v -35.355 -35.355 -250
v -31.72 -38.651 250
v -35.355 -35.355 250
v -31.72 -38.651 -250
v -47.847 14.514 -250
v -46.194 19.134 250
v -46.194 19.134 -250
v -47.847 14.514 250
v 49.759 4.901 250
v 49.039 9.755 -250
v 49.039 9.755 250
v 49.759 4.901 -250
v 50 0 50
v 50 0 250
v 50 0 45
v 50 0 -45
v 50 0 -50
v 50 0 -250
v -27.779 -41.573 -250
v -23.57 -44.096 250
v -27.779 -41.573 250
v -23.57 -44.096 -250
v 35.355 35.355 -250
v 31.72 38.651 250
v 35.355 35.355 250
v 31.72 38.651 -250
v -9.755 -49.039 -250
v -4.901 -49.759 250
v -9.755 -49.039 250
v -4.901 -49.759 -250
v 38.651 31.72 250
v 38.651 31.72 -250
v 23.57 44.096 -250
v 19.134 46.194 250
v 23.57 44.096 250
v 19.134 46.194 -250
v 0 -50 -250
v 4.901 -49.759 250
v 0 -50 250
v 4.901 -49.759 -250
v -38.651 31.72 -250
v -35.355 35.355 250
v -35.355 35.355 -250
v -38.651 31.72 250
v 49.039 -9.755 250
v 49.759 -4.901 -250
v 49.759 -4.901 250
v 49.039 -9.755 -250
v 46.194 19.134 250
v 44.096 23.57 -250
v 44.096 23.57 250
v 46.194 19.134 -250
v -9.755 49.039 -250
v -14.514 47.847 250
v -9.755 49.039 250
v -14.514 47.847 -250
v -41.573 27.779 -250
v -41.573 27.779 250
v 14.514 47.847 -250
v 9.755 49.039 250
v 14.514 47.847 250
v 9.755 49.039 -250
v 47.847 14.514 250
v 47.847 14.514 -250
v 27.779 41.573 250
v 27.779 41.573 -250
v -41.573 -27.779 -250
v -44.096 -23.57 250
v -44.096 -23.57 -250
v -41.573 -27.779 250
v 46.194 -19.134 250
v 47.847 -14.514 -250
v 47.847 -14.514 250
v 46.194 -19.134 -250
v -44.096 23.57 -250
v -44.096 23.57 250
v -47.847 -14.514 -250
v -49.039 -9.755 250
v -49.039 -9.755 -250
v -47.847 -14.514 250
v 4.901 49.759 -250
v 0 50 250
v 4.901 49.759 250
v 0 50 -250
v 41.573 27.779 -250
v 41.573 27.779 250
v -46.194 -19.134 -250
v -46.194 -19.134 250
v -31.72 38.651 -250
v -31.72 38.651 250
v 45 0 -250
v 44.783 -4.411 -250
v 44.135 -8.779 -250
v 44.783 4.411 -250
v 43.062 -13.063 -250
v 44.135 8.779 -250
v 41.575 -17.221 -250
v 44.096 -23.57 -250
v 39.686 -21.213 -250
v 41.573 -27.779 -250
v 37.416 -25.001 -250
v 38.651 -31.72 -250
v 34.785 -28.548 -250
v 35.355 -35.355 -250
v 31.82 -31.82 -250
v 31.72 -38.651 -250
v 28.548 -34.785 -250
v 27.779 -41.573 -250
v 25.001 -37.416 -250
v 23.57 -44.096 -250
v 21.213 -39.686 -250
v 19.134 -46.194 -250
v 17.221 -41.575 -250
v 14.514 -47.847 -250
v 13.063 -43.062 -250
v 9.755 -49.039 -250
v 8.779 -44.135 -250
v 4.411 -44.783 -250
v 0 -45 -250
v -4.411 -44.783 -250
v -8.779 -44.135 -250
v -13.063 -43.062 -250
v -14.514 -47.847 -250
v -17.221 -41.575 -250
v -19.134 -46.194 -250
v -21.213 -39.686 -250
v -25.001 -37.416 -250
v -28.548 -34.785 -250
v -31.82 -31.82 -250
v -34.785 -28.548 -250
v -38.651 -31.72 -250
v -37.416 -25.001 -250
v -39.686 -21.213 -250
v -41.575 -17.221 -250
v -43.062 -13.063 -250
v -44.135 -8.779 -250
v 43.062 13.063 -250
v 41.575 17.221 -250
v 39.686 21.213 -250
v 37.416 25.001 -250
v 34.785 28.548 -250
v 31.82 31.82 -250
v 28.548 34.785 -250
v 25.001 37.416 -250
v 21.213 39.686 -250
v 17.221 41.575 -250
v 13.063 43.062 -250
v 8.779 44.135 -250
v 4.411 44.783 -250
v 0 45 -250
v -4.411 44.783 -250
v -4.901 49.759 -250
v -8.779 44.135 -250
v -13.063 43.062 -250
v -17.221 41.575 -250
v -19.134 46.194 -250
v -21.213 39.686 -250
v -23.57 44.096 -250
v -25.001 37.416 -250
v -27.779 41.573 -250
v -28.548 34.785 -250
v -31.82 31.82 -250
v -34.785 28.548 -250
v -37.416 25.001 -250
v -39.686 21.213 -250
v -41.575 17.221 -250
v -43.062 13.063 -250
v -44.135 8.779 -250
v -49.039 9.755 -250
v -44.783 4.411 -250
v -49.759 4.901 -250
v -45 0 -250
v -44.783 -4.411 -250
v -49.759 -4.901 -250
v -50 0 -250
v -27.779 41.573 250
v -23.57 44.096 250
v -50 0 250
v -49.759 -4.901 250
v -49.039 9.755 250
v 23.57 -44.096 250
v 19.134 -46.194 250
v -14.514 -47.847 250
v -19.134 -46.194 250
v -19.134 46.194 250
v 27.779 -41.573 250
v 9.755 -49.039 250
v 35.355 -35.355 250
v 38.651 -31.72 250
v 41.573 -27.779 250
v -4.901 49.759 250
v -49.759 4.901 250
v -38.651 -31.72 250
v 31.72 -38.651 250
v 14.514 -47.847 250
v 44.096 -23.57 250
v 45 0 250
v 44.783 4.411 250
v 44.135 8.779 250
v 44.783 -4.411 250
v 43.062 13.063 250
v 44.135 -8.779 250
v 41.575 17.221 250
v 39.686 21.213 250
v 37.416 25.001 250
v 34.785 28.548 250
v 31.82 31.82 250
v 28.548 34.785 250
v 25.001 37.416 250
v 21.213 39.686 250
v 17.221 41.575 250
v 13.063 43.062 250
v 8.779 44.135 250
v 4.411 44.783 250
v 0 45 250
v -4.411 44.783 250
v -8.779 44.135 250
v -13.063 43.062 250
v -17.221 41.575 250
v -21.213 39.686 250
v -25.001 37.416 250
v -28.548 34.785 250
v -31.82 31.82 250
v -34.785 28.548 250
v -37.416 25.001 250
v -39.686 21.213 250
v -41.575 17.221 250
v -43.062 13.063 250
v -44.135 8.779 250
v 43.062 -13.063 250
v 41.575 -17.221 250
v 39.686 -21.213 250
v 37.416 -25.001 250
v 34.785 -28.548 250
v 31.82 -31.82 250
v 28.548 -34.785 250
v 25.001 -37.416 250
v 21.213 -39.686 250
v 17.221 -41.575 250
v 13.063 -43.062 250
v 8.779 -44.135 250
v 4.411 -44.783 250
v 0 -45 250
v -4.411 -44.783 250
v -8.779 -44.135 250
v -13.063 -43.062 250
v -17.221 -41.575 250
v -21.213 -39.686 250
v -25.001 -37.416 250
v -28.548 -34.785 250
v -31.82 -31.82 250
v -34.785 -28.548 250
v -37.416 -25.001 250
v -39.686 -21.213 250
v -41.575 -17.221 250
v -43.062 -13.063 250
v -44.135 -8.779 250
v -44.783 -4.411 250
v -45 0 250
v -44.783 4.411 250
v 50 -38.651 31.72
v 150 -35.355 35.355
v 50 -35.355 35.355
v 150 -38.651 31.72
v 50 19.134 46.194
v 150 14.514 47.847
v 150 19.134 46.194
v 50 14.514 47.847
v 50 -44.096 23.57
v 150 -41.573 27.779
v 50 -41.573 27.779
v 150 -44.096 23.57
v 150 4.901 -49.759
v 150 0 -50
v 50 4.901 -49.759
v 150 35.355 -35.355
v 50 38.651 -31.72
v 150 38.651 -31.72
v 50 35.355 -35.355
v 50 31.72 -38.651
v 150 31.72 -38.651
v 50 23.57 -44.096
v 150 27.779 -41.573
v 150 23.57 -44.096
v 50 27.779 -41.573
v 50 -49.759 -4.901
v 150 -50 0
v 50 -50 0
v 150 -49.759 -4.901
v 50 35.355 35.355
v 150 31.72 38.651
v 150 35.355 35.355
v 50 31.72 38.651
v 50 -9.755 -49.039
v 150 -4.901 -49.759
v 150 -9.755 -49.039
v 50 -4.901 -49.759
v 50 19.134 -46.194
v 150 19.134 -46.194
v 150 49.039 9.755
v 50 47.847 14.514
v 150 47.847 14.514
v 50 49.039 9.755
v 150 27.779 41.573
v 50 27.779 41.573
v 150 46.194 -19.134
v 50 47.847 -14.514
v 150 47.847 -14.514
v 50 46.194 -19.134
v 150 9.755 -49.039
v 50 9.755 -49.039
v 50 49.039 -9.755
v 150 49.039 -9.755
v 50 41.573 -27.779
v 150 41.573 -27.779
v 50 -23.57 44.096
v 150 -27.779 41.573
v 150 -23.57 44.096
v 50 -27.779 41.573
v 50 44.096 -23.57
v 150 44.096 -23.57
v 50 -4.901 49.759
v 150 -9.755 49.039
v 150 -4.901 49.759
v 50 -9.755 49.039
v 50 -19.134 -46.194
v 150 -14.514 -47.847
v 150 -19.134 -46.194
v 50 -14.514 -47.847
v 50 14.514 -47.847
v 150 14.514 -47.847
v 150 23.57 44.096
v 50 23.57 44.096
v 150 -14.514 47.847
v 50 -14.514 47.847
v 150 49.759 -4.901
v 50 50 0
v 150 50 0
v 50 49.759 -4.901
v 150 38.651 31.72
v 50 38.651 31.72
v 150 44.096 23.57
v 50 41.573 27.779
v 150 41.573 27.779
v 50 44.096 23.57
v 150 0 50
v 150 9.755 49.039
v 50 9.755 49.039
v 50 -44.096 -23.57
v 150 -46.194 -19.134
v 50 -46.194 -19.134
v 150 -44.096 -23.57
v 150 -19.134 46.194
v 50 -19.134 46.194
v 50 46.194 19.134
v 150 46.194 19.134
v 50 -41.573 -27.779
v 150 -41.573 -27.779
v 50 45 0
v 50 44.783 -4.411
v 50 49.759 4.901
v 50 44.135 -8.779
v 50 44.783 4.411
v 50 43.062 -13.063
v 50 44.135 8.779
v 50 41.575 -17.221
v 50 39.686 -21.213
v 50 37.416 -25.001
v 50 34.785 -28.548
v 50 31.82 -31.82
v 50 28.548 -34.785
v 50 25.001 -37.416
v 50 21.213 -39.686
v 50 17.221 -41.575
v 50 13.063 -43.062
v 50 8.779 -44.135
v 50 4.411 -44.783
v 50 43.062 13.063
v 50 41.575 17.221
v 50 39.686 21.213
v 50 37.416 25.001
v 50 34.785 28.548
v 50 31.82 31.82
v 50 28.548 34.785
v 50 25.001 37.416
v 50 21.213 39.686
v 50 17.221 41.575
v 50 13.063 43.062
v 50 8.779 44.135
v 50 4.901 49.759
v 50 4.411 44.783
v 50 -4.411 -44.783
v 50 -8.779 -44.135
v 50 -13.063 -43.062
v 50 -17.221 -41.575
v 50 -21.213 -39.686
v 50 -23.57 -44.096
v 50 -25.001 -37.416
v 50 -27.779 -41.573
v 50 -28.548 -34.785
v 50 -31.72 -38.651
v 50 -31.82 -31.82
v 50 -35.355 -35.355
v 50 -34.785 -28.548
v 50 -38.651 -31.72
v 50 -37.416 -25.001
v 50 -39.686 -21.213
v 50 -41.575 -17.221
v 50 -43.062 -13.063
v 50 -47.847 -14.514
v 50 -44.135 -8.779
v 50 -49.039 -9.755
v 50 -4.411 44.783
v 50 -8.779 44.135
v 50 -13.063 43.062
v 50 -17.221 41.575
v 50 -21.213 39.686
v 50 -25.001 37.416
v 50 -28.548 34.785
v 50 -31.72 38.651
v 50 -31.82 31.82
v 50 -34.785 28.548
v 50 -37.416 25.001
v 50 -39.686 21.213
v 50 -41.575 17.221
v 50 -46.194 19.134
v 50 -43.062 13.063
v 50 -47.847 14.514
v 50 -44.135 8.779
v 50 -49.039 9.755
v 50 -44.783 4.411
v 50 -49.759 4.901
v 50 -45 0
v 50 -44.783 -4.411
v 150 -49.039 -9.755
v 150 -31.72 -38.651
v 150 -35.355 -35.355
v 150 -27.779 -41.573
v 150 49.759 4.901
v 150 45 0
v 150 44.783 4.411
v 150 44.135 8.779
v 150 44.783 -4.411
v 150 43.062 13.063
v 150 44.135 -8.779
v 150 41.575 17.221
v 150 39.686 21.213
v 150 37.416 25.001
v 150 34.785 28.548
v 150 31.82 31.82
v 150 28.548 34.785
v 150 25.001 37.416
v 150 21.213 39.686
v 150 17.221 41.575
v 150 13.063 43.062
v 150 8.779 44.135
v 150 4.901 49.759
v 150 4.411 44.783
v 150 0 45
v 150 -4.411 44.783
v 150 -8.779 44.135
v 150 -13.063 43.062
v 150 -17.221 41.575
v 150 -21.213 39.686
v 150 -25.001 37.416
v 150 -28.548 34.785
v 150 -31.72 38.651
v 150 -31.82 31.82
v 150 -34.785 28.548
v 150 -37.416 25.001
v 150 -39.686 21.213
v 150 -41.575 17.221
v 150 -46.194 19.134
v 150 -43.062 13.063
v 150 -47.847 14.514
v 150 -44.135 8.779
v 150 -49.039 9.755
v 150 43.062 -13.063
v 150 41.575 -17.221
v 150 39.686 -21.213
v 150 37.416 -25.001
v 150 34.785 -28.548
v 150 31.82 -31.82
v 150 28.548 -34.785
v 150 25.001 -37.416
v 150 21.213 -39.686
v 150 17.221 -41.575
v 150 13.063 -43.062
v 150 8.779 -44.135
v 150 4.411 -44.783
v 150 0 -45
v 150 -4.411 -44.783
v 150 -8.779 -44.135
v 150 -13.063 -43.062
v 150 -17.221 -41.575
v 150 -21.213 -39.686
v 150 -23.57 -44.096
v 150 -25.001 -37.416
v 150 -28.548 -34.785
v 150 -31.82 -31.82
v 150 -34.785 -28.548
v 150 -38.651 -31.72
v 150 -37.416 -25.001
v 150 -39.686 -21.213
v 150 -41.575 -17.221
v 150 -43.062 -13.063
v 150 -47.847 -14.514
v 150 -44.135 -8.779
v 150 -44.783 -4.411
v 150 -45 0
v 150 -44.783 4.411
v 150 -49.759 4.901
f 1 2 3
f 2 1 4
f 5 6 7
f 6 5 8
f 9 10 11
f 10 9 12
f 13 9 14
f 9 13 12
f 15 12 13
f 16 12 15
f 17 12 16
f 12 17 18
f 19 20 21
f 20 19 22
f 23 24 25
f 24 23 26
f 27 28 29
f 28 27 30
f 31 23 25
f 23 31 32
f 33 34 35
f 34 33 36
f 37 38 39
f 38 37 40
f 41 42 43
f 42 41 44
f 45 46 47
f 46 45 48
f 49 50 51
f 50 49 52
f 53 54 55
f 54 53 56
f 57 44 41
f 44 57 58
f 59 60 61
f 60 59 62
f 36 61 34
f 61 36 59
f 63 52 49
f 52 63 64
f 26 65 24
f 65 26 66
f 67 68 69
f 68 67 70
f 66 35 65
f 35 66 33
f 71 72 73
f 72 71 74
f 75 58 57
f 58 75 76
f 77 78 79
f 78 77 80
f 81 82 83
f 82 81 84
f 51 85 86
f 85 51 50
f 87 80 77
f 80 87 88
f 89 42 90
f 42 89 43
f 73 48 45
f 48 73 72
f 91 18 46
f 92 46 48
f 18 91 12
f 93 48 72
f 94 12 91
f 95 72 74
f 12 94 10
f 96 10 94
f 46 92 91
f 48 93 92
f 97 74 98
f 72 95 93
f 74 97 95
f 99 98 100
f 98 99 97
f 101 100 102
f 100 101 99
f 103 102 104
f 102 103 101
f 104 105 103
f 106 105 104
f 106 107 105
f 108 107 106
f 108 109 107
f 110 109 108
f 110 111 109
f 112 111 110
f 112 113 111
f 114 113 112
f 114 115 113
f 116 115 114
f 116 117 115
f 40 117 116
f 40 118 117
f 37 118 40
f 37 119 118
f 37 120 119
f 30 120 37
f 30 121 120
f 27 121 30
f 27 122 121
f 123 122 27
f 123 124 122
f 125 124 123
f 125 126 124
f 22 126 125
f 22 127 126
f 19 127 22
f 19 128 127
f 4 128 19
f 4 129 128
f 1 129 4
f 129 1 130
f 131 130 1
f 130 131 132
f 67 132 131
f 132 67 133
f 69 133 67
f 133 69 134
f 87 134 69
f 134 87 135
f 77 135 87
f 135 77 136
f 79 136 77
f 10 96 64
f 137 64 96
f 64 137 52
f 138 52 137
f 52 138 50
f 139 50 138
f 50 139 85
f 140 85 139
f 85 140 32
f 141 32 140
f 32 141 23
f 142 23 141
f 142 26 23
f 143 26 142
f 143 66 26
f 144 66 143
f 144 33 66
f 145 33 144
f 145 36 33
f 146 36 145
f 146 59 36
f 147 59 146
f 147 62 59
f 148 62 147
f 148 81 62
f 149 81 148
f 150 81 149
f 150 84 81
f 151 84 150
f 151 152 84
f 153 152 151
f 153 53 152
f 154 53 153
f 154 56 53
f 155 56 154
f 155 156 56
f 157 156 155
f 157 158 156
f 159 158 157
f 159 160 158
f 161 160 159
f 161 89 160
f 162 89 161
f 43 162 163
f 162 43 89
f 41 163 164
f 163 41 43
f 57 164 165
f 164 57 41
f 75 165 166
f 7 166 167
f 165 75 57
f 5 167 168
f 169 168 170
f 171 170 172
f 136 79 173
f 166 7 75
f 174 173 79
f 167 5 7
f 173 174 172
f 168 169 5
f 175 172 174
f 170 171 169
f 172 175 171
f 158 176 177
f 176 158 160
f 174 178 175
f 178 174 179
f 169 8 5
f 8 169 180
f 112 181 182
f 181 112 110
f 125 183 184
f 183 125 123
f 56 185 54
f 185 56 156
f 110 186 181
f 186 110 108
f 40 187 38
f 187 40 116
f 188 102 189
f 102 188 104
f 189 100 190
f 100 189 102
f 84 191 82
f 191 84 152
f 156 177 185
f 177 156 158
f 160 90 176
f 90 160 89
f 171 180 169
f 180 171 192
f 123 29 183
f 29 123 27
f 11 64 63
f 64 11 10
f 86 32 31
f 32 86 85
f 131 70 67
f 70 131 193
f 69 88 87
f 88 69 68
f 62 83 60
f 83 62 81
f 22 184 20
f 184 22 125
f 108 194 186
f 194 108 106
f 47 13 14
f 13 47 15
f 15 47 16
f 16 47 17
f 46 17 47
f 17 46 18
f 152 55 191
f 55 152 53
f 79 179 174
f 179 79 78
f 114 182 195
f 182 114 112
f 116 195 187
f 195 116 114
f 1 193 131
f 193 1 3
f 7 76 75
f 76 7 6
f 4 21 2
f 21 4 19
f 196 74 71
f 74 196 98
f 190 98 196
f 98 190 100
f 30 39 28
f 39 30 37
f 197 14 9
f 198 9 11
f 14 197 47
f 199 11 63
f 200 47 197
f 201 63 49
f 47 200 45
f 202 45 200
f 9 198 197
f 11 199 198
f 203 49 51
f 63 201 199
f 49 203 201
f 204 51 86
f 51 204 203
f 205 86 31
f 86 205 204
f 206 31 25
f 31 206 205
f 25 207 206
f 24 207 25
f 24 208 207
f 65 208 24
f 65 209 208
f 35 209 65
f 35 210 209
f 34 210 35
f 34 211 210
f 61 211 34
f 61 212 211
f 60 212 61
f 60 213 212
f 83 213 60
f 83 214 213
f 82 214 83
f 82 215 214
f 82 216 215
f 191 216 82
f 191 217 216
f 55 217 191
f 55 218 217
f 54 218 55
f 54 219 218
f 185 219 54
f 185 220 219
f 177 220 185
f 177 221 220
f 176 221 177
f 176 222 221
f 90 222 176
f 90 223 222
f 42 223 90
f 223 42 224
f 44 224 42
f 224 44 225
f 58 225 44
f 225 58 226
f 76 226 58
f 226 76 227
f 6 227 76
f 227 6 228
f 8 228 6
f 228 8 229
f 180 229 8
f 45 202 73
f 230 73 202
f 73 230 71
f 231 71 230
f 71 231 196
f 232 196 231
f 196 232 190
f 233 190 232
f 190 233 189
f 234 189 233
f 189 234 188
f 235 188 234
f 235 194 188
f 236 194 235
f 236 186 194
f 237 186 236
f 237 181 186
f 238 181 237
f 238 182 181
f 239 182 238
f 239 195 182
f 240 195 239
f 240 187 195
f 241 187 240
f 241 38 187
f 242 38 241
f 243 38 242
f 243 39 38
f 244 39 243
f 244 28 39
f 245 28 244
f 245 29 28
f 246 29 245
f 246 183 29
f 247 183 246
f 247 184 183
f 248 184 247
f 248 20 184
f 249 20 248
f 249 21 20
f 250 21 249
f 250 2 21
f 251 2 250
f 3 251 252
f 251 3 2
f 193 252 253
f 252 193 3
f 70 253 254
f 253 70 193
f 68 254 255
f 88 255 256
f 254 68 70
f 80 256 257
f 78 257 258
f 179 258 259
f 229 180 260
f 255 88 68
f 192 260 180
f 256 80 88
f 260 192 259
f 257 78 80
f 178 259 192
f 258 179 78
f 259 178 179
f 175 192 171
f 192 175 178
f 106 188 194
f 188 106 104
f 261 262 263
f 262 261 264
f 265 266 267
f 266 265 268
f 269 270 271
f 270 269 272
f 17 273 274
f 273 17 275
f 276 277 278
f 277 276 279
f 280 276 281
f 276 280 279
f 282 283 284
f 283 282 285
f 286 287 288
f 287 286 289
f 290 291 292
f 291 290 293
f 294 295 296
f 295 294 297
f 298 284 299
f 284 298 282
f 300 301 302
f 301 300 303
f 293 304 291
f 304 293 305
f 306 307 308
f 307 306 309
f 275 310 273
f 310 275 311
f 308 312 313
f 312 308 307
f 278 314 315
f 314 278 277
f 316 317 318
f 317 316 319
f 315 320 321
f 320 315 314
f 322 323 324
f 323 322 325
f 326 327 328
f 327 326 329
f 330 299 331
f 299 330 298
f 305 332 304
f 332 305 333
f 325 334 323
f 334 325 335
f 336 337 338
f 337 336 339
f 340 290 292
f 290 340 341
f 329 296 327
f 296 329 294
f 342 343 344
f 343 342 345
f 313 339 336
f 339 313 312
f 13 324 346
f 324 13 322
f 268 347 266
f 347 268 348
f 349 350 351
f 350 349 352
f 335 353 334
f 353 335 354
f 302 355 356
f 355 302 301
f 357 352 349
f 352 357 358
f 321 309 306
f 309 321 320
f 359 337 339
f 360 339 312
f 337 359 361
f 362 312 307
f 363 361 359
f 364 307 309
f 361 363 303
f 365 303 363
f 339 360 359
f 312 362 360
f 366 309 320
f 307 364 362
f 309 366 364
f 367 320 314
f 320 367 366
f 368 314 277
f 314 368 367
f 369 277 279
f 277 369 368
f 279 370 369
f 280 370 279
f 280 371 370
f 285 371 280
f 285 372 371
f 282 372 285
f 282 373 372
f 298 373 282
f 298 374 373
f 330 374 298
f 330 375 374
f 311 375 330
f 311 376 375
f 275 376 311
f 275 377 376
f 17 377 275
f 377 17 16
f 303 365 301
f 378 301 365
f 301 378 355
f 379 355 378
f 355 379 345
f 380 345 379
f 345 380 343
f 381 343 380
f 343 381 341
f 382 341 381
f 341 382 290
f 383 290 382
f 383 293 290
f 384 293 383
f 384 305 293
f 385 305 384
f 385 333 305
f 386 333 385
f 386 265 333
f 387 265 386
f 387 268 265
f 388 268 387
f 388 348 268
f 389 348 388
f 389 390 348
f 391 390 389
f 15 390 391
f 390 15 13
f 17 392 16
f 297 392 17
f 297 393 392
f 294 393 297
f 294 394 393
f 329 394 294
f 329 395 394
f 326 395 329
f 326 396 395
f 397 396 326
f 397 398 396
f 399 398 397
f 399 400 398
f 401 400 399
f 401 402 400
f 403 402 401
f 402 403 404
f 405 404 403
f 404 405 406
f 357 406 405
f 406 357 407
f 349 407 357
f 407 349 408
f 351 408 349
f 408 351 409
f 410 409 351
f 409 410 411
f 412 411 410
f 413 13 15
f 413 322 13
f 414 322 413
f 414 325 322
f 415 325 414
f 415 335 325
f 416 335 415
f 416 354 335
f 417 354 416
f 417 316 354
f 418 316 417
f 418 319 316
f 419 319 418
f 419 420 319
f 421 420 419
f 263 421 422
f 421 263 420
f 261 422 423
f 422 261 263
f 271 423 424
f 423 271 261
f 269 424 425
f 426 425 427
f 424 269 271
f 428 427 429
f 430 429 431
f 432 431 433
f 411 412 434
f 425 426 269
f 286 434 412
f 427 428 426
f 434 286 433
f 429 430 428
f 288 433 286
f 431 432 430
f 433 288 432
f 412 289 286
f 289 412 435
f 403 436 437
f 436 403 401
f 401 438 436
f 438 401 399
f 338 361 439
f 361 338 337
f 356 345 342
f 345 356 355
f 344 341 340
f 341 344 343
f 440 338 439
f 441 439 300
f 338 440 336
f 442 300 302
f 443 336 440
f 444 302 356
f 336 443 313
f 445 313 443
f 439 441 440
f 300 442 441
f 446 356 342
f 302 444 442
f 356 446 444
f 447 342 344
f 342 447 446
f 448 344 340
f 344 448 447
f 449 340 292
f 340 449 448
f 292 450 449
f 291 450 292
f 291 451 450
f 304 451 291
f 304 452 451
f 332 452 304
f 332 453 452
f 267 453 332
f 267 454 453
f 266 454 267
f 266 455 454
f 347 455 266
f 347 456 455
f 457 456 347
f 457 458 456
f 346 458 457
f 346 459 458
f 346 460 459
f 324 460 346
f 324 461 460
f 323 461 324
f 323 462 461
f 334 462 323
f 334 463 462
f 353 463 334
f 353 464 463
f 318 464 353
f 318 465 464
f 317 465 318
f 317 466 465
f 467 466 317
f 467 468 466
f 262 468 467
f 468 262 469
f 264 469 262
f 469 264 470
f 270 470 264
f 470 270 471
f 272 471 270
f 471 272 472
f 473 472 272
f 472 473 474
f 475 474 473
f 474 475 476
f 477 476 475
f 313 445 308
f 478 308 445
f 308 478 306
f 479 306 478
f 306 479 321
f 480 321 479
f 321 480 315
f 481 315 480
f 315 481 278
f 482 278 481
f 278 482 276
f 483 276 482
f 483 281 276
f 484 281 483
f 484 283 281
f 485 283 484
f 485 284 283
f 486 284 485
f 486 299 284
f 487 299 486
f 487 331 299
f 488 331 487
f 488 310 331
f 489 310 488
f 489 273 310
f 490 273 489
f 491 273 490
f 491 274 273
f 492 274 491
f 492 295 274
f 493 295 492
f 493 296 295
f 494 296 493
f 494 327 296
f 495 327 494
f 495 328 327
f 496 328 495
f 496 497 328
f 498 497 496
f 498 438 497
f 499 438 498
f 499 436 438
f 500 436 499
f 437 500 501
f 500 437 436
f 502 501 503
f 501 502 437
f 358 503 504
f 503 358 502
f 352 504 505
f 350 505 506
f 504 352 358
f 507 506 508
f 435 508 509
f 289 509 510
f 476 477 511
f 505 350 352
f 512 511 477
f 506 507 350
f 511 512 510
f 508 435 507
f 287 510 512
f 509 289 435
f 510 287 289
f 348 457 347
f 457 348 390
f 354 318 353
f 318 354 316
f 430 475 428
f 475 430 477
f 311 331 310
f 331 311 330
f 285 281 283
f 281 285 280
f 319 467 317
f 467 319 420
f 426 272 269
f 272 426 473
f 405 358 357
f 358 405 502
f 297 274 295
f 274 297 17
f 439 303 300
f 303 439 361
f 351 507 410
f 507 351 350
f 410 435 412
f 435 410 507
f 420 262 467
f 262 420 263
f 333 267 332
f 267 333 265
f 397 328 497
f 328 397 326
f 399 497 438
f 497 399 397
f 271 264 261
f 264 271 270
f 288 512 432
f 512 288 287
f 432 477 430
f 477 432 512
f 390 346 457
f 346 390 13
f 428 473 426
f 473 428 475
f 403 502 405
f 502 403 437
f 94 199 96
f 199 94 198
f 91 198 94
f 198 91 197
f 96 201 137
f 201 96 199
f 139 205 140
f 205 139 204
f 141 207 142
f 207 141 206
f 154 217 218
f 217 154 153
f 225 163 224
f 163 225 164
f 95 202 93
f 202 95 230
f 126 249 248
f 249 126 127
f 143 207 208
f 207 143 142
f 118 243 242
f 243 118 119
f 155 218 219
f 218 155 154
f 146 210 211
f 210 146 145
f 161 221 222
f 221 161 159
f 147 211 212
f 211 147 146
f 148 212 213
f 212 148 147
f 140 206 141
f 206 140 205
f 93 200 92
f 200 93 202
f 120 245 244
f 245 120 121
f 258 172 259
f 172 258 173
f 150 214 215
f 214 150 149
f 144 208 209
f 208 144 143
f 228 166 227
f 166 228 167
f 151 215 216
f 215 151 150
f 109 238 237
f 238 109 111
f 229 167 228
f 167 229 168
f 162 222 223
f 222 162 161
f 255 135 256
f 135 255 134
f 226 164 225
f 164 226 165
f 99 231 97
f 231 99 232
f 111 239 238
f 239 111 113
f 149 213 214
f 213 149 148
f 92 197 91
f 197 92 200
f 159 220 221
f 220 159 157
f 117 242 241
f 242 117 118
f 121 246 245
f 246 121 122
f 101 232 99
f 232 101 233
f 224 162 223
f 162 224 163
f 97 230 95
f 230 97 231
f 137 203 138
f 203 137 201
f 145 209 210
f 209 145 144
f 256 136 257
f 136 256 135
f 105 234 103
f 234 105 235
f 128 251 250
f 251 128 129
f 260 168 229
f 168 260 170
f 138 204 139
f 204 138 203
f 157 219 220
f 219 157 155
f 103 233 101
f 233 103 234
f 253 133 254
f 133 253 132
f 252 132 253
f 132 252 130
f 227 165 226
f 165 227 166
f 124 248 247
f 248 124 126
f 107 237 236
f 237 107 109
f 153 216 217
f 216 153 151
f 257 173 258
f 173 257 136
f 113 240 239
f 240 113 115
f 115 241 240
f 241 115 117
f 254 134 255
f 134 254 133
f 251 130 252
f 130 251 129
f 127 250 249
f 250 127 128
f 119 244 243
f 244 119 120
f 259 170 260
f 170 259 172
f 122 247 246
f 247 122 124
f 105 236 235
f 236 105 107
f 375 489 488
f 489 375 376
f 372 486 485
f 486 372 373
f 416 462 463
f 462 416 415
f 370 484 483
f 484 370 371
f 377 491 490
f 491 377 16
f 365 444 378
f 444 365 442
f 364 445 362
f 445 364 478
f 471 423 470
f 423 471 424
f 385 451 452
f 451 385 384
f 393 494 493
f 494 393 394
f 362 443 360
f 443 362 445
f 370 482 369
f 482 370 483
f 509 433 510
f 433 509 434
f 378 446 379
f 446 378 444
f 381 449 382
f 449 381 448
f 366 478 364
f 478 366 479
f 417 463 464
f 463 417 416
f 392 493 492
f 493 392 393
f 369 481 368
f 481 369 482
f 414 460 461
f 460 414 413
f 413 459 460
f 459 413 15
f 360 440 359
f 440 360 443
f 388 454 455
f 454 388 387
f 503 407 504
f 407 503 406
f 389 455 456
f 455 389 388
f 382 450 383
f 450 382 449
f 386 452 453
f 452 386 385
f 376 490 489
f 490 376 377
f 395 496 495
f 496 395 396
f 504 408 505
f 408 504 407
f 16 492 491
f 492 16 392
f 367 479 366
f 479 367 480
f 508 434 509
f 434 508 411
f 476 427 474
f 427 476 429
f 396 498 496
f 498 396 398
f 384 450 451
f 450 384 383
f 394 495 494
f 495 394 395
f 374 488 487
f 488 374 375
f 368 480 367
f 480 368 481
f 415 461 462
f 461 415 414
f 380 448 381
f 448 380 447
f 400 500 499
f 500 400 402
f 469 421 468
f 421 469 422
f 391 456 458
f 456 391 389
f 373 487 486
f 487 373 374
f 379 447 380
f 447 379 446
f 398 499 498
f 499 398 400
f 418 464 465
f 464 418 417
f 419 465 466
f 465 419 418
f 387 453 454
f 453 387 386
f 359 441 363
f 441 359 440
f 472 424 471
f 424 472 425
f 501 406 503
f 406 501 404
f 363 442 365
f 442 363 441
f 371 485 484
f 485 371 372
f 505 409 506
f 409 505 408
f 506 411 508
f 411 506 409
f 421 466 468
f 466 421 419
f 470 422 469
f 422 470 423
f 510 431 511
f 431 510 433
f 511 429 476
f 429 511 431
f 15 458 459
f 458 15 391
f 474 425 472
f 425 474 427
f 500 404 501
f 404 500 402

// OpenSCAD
module ht_90_pipe() {
    difference() {
        union() {
            // Main pipe
            translate([0, 0, -250])
                cylinder(h=500, r=50, $fn=64);
            // Elbow pipe
            translate([50, 0, 0])
                rotate([0, 90, 0])
                cylinder(h=100, r=50, $fn=64);
        }
        // Inner hollow
        union() {
            translate([0, 0, -250])
                cylinder(h=500, r=45, $fn=64);
            translate([50, 0, 0])
                rotate([0, 90, 0])
                cylinder(h=100, r=45, $fn=64);
        }
    }
}

ht_90_pipe();
